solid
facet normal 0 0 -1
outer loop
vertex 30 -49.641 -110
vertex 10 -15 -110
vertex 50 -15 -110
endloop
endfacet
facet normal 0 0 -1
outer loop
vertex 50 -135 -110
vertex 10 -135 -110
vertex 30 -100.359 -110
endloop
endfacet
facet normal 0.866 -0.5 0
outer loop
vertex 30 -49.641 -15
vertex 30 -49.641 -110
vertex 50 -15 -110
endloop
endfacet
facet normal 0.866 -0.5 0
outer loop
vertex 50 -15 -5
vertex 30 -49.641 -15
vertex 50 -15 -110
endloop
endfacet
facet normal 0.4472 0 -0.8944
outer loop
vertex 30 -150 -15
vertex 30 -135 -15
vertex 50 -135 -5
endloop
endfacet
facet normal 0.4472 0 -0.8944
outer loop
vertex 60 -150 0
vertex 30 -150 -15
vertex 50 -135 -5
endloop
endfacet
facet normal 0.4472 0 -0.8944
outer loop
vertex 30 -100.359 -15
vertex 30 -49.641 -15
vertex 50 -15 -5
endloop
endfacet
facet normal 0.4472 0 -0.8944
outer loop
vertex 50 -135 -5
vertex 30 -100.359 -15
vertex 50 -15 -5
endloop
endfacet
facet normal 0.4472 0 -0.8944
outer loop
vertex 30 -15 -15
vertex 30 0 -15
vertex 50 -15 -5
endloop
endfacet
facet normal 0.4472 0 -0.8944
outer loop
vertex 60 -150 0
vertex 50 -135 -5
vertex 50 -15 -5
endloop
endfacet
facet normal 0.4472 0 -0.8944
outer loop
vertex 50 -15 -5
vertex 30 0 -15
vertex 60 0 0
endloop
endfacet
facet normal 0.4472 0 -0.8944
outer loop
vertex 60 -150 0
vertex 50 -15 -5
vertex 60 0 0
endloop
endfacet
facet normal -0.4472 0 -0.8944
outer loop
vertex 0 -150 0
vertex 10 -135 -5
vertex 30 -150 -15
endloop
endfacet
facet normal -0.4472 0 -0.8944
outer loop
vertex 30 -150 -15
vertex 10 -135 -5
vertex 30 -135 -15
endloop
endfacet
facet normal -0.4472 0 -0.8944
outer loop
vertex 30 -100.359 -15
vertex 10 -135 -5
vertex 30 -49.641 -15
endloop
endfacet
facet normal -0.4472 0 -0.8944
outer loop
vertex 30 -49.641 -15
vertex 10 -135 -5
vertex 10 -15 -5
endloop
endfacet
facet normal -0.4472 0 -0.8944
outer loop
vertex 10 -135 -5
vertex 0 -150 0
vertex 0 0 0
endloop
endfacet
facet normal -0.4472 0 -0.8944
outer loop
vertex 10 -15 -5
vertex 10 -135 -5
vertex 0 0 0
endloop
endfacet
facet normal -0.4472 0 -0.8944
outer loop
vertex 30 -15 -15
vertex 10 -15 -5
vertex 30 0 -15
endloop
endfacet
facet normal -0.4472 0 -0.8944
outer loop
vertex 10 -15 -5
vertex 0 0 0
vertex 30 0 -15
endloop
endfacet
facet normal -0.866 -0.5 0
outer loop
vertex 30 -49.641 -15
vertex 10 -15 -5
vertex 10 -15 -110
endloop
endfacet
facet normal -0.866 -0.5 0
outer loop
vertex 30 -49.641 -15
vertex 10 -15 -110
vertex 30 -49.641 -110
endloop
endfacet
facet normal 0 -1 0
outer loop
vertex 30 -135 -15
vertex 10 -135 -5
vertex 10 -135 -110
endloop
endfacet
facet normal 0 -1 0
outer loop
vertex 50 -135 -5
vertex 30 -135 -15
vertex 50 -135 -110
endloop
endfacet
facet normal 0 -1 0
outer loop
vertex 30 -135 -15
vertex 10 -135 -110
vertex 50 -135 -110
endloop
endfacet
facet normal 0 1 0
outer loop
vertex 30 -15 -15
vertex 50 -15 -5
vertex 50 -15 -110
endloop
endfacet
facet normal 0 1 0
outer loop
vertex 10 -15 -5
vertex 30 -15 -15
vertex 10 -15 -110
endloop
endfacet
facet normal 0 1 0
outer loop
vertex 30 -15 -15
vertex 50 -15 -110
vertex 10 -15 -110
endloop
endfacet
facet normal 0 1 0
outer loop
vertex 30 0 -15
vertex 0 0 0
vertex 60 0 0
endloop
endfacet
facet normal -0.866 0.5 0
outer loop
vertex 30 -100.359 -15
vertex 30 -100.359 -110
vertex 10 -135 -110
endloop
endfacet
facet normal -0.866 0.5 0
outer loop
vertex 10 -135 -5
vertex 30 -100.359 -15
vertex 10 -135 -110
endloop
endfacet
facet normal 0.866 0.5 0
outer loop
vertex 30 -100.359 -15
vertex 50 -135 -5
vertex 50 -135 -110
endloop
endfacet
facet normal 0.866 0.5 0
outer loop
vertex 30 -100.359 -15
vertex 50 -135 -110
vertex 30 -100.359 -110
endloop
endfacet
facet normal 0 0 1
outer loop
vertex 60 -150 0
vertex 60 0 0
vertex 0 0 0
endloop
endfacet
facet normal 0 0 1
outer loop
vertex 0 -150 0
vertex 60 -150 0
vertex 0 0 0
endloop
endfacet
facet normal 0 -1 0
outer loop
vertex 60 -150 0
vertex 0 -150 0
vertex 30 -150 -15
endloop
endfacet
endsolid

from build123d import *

# Parameters (mm, degrees)
F1_DEPTH = 150
F4_DEPTH = 110


with BuildPart() as f1:
    # F0 (on Front) → F1 (new body)
    with BuildSketch(Plane.XZ):
        Polygon((60, 0), (0, 0), (30, -15), align=None)
    extrude(amount=F1_DEPTH)

    # F3 (on offset) → F4 (join)
    with BuildSketch(Plane.XY.offset(-110)):
        Polygon((30, -100.3589838486), (10, -135), (50, -135), align=None)
        Polygon((30, -49.6410161514), (50, -15), (10, -15), align=None)
    extrude(amount=F4_DEPTH)


solid = f1.part
